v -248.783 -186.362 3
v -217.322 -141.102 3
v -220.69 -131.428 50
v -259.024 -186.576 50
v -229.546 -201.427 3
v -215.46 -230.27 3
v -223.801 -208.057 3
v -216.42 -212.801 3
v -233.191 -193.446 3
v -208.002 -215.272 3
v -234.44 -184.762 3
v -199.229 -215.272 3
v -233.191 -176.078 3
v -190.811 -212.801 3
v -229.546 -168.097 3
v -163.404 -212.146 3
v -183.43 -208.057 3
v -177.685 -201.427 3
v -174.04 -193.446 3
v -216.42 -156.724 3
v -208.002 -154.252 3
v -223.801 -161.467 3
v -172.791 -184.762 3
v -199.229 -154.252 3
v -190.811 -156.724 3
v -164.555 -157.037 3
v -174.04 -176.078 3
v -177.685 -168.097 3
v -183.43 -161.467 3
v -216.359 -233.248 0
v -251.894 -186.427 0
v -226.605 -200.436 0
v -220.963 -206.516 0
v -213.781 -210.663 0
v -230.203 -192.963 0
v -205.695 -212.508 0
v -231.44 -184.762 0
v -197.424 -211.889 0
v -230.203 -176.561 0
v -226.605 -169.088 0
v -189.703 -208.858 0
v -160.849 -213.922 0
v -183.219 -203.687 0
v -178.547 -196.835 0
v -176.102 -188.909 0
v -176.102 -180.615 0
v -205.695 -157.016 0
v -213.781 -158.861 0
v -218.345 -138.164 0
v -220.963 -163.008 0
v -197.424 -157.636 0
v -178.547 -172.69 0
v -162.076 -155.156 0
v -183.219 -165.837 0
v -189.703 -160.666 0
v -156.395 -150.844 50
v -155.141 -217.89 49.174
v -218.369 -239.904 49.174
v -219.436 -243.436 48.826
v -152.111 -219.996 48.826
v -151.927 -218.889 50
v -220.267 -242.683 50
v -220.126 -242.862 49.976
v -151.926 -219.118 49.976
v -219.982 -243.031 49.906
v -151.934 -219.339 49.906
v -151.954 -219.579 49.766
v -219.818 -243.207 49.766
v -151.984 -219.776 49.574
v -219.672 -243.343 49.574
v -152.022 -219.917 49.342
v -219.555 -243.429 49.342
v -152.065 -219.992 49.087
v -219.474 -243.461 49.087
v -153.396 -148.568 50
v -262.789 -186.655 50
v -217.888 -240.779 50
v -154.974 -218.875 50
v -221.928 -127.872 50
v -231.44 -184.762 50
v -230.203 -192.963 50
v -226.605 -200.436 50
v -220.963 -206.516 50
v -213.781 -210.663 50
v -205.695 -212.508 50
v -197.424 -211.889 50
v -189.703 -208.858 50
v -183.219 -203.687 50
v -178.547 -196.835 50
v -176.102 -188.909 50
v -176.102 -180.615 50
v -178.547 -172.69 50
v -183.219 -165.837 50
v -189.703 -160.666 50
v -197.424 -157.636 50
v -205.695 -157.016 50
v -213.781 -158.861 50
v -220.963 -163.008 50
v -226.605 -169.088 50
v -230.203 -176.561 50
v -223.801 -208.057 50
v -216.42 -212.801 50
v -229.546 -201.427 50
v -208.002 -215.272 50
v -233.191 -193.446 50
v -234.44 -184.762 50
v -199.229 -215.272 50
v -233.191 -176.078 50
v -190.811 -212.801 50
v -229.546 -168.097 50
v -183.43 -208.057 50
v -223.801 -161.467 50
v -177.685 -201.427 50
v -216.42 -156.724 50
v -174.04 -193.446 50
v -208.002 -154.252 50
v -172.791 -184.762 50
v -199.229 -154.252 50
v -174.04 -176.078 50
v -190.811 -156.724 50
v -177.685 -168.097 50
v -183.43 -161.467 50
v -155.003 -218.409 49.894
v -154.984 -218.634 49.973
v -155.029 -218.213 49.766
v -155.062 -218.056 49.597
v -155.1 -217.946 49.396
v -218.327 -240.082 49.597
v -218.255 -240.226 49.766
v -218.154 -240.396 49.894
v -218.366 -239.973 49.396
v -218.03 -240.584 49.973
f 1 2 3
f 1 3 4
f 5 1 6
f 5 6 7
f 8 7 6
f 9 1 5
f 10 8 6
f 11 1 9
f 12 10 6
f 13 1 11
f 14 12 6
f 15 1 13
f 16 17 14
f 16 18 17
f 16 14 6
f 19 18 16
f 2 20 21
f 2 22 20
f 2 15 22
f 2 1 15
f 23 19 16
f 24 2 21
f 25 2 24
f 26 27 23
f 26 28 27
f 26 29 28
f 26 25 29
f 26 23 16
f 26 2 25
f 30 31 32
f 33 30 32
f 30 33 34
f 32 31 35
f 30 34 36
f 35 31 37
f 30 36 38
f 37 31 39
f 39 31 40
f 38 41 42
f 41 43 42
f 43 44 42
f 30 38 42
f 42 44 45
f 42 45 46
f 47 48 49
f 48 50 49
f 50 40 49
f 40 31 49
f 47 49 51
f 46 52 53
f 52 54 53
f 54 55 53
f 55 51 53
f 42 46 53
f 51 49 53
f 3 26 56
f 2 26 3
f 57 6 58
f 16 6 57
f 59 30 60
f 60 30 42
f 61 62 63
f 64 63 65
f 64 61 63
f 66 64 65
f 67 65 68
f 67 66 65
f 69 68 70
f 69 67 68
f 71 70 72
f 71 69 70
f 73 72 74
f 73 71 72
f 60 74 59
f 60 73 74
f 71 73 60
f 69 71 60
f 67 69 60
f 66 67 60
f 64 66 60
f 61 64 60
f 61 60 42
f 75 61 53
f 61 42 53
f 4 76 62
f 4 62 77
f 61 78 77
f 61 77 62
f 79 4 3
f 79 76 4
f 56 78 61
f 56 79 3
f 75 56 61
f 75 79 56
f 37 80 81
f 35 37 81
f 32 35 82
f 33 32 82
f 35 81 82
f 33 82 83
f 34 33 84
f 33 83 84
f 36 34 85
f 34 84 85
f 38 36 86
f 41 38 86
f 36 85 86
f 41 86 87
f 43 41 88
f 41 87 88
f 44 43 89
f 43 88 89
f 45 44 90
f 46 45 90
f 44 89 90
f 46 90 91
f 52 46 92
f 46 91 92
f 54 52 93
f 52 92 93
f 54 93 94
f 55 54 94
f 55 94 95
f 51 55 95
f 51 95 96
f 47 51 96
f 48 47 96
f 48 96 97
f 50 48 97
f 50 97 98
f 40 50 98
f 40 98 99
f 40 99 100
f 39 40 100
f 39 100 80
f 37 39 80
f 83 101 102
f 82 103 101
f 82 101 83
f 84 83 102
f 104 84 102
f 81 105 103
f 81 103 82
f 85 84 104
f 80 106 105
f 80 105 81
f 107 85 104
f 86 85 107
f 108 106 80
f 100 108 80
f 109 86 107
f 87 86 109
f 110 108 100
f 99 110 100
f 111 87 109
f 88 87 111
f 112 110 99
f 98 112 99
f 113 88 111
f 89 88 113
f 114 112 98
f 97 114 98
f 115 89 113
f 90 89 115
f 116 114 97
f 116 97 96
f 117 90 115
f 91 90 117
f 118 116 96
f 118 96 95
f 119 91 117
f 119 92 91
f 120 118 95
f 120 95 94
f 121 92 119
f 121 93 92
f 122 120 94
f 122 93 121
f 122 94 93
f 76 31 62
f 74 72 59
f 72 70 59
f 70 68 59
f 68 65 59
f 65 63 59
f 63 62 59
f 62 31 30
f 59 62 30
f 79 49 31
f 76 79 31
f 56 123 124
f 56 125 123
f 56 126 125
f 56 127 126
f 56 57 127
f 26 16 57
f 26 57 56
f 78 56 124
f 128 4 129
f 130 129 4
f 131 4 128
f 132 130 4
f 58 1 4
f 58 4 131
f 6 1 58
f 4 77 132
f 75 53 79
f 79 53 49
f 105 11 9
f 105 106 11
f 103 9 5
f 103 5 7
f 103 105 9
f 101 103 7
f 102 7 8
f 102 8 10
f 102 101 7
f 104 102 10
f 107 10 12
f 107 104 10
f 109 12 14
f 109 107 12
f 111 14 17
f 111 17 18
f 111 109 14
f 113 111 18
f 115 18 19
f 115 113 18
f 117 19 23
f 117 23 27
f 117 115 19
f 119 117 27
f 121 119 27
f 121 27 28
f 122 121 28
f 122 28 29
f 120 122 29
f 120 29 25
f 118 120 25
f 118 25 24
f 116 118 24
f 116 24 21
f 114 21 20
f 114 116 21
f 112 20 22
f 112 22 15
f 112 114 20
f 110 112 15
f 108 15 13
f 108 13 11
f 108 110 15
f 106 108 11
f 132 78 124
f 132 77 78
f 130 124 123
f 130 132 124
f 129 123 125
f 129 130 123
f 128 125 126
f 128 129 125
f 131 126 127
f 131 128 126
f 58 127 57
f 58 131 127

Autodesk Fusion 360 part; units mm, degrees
sketch "스케치1" plane through (0, 0, 0) normal (0, 0, 1) x (1, 0, 0)
  line L0 (-15, 6) -> (-22, -7)
  line L1 (-22, -7) -> (-9, -9)
  line L2 (-9, -9) -> (-3, 0)
  line L3 (-3, 0) -> (-12, 7)
  line L4 (3, 5) -> (3, -9.4098)
  line L5 (3, -9.4098) -> (20.2982, -14.6076)
  line L6 (20.2982, -14.6076) -> (26.171, 4.9371)
  line L7 (26.171, 4.9371) -> (7.7071, 8.424)
  line L8 (42.6307, 4.9371) -> (42, -15)
  line L9 (42, -15) -> (67.9355, -17.567)
  line L10 (67.9355, -17.567) -> (65.6256, 5.8006)
  line L11 (65.6256, 5.8006) -> (42.6307, 4.9371)
  line L12 (78.9292, 2.5635) -> (78.4348, -13.0662)
  line L13 (78.4348, -13.0662) -> (106, -18)
  arc A0 (106, -18) -> (78.9292, 2.5635) centre (112.5801, 18.7627) ccw
  line L14 (-78.1892, -7.301) -> (-40, -7.301)
  line L15 (-40, -7.301) -> (-40, 37.2455)
  arc A1 (-40, 37.2455) -> (-75, 40) centre (-57.6084, 37.2455) ccw
  line L16 (-75, 40) -> (-75, -7.301)
  line L17 (-75, -25) -> (-35, -25)
  line L18 (-35, -25) -> (-35, -65)
  line L19 (-35, -65) -> (-75, -65)
  line L20 (-75, -65) -> (-75, -25)
  line L21 (20, -31.5) -> (70, -31.5)
  line L22 (70, -31.5) -> (70, -81.5)
  line L23 (70, -81.5) -> (20, -81.5)
  line L24 (20, -81.5) -> (20, -31.5)
  curve L25
  curve L26
  curve L27
  curve L28
  curve L29 construction
  curve L30 construction
  line L31 (221.7769, -77.0241) -> (180.313, -77.0241)
  line L32 (180.313, -77.0241) -> (180.313, -31.5347)
  line L33 (180.313, -31.5347) -> (221.7769, -31.5347)
  line L34 (221.7769, -31.5347) -> (221.7769, -77.0241)
  line L35 (221.7769, -77.0241) -> (180.313, -31.5347) construction
  line L36 (180.313, -77.0241) -> (221.7769, -31.5347) construction
  circle A2 centre (-30, -160) radius 25.461
  circle A3 centre (27.6815, -165.0053) radius 31.7614
  circle A4 centre (125.6318, -141.5124) radius 31.894
  circle A5 centre (125.6318, -141.5124) radius 31.894
  circle A6 centre (157.3931, -144.4186) radius 36.4671
  circle A7 centre (190.6677, -144.4186) radius 5.5401
  circle A8 centre (152.4397, -176.5897) radius 12.8987
  circle A9 centre (125.6318, -192.8529) radius 43.2366
  circle A10 centre (125.6318, -173.4064) radius 27.8792
  line L37 (-174.3672, -75.4378) -> (-188.8141, -19.5395)
  line L38 (-188.8141, -19.5395) -> (-244.4468, -4.1017)
  line L39 (-244.4468, -4.1017) -> (-285.6328, -44.5622)
  line L40 (-285.6328, -44.5622) -> (-271.1859, -100.4605)
  line L41 (-271.1859, -100.4605) -> (-215.5532, -115.8983)
  line L42 (-215.5532, -115.8983) -> (-174.3672, -75.4378)
  line L43 (-160.849, -213.9216) -> (-162.0762, -155.1559)
  line L44 (-162.0762, -155.1559) -> (-218.345, -138.1635)
  line L45 (-218.345, -138.1635) -> (-251.8938, -186.4273)
  line L46 (-251.8938, -186.4273) -> (-216.3593, -233.2484)
  line L47 (-216.3593, -233.2484) -> (-160.849, -213.9216)
  point P0 (201.045, -54.2794)
  point P1 (-230, -60)
  point P2 (-201.9047, -185.3833)
  dimension "d1" = 40
  dimension "d2" = 40
  dimension "d3" = 50
  dimension "d4" = 50
  dimension "d5" = 50
  dimension "d6" = 60
  dimension "d7" = 60
  dimension "d8" = 60
  dimension "d9" = 50
  dimension "d10" = 50
extrude "돌출1" add sketch "스케치1" along normal blind 50 draft 10 contours L43 L44 L45 L46 L47
sketch "스케치2" plane through (0, 0, 50) normal (0, 0, 1) x (-1, 0, 0)
  circle A0 centre (203.6154, 184.7621) radius 27.8241
extrude "돌출2" cut sketch "스케치2" against normal blind 50
shell "쉘1" thickness 3 removed faces 1 at (-160.3626, -184.4905, 50)
fillet "필렛1" radius 1 2 edges at (-185.7053, -231.9111, 50) (-186.7069, -229.0342, 50)
